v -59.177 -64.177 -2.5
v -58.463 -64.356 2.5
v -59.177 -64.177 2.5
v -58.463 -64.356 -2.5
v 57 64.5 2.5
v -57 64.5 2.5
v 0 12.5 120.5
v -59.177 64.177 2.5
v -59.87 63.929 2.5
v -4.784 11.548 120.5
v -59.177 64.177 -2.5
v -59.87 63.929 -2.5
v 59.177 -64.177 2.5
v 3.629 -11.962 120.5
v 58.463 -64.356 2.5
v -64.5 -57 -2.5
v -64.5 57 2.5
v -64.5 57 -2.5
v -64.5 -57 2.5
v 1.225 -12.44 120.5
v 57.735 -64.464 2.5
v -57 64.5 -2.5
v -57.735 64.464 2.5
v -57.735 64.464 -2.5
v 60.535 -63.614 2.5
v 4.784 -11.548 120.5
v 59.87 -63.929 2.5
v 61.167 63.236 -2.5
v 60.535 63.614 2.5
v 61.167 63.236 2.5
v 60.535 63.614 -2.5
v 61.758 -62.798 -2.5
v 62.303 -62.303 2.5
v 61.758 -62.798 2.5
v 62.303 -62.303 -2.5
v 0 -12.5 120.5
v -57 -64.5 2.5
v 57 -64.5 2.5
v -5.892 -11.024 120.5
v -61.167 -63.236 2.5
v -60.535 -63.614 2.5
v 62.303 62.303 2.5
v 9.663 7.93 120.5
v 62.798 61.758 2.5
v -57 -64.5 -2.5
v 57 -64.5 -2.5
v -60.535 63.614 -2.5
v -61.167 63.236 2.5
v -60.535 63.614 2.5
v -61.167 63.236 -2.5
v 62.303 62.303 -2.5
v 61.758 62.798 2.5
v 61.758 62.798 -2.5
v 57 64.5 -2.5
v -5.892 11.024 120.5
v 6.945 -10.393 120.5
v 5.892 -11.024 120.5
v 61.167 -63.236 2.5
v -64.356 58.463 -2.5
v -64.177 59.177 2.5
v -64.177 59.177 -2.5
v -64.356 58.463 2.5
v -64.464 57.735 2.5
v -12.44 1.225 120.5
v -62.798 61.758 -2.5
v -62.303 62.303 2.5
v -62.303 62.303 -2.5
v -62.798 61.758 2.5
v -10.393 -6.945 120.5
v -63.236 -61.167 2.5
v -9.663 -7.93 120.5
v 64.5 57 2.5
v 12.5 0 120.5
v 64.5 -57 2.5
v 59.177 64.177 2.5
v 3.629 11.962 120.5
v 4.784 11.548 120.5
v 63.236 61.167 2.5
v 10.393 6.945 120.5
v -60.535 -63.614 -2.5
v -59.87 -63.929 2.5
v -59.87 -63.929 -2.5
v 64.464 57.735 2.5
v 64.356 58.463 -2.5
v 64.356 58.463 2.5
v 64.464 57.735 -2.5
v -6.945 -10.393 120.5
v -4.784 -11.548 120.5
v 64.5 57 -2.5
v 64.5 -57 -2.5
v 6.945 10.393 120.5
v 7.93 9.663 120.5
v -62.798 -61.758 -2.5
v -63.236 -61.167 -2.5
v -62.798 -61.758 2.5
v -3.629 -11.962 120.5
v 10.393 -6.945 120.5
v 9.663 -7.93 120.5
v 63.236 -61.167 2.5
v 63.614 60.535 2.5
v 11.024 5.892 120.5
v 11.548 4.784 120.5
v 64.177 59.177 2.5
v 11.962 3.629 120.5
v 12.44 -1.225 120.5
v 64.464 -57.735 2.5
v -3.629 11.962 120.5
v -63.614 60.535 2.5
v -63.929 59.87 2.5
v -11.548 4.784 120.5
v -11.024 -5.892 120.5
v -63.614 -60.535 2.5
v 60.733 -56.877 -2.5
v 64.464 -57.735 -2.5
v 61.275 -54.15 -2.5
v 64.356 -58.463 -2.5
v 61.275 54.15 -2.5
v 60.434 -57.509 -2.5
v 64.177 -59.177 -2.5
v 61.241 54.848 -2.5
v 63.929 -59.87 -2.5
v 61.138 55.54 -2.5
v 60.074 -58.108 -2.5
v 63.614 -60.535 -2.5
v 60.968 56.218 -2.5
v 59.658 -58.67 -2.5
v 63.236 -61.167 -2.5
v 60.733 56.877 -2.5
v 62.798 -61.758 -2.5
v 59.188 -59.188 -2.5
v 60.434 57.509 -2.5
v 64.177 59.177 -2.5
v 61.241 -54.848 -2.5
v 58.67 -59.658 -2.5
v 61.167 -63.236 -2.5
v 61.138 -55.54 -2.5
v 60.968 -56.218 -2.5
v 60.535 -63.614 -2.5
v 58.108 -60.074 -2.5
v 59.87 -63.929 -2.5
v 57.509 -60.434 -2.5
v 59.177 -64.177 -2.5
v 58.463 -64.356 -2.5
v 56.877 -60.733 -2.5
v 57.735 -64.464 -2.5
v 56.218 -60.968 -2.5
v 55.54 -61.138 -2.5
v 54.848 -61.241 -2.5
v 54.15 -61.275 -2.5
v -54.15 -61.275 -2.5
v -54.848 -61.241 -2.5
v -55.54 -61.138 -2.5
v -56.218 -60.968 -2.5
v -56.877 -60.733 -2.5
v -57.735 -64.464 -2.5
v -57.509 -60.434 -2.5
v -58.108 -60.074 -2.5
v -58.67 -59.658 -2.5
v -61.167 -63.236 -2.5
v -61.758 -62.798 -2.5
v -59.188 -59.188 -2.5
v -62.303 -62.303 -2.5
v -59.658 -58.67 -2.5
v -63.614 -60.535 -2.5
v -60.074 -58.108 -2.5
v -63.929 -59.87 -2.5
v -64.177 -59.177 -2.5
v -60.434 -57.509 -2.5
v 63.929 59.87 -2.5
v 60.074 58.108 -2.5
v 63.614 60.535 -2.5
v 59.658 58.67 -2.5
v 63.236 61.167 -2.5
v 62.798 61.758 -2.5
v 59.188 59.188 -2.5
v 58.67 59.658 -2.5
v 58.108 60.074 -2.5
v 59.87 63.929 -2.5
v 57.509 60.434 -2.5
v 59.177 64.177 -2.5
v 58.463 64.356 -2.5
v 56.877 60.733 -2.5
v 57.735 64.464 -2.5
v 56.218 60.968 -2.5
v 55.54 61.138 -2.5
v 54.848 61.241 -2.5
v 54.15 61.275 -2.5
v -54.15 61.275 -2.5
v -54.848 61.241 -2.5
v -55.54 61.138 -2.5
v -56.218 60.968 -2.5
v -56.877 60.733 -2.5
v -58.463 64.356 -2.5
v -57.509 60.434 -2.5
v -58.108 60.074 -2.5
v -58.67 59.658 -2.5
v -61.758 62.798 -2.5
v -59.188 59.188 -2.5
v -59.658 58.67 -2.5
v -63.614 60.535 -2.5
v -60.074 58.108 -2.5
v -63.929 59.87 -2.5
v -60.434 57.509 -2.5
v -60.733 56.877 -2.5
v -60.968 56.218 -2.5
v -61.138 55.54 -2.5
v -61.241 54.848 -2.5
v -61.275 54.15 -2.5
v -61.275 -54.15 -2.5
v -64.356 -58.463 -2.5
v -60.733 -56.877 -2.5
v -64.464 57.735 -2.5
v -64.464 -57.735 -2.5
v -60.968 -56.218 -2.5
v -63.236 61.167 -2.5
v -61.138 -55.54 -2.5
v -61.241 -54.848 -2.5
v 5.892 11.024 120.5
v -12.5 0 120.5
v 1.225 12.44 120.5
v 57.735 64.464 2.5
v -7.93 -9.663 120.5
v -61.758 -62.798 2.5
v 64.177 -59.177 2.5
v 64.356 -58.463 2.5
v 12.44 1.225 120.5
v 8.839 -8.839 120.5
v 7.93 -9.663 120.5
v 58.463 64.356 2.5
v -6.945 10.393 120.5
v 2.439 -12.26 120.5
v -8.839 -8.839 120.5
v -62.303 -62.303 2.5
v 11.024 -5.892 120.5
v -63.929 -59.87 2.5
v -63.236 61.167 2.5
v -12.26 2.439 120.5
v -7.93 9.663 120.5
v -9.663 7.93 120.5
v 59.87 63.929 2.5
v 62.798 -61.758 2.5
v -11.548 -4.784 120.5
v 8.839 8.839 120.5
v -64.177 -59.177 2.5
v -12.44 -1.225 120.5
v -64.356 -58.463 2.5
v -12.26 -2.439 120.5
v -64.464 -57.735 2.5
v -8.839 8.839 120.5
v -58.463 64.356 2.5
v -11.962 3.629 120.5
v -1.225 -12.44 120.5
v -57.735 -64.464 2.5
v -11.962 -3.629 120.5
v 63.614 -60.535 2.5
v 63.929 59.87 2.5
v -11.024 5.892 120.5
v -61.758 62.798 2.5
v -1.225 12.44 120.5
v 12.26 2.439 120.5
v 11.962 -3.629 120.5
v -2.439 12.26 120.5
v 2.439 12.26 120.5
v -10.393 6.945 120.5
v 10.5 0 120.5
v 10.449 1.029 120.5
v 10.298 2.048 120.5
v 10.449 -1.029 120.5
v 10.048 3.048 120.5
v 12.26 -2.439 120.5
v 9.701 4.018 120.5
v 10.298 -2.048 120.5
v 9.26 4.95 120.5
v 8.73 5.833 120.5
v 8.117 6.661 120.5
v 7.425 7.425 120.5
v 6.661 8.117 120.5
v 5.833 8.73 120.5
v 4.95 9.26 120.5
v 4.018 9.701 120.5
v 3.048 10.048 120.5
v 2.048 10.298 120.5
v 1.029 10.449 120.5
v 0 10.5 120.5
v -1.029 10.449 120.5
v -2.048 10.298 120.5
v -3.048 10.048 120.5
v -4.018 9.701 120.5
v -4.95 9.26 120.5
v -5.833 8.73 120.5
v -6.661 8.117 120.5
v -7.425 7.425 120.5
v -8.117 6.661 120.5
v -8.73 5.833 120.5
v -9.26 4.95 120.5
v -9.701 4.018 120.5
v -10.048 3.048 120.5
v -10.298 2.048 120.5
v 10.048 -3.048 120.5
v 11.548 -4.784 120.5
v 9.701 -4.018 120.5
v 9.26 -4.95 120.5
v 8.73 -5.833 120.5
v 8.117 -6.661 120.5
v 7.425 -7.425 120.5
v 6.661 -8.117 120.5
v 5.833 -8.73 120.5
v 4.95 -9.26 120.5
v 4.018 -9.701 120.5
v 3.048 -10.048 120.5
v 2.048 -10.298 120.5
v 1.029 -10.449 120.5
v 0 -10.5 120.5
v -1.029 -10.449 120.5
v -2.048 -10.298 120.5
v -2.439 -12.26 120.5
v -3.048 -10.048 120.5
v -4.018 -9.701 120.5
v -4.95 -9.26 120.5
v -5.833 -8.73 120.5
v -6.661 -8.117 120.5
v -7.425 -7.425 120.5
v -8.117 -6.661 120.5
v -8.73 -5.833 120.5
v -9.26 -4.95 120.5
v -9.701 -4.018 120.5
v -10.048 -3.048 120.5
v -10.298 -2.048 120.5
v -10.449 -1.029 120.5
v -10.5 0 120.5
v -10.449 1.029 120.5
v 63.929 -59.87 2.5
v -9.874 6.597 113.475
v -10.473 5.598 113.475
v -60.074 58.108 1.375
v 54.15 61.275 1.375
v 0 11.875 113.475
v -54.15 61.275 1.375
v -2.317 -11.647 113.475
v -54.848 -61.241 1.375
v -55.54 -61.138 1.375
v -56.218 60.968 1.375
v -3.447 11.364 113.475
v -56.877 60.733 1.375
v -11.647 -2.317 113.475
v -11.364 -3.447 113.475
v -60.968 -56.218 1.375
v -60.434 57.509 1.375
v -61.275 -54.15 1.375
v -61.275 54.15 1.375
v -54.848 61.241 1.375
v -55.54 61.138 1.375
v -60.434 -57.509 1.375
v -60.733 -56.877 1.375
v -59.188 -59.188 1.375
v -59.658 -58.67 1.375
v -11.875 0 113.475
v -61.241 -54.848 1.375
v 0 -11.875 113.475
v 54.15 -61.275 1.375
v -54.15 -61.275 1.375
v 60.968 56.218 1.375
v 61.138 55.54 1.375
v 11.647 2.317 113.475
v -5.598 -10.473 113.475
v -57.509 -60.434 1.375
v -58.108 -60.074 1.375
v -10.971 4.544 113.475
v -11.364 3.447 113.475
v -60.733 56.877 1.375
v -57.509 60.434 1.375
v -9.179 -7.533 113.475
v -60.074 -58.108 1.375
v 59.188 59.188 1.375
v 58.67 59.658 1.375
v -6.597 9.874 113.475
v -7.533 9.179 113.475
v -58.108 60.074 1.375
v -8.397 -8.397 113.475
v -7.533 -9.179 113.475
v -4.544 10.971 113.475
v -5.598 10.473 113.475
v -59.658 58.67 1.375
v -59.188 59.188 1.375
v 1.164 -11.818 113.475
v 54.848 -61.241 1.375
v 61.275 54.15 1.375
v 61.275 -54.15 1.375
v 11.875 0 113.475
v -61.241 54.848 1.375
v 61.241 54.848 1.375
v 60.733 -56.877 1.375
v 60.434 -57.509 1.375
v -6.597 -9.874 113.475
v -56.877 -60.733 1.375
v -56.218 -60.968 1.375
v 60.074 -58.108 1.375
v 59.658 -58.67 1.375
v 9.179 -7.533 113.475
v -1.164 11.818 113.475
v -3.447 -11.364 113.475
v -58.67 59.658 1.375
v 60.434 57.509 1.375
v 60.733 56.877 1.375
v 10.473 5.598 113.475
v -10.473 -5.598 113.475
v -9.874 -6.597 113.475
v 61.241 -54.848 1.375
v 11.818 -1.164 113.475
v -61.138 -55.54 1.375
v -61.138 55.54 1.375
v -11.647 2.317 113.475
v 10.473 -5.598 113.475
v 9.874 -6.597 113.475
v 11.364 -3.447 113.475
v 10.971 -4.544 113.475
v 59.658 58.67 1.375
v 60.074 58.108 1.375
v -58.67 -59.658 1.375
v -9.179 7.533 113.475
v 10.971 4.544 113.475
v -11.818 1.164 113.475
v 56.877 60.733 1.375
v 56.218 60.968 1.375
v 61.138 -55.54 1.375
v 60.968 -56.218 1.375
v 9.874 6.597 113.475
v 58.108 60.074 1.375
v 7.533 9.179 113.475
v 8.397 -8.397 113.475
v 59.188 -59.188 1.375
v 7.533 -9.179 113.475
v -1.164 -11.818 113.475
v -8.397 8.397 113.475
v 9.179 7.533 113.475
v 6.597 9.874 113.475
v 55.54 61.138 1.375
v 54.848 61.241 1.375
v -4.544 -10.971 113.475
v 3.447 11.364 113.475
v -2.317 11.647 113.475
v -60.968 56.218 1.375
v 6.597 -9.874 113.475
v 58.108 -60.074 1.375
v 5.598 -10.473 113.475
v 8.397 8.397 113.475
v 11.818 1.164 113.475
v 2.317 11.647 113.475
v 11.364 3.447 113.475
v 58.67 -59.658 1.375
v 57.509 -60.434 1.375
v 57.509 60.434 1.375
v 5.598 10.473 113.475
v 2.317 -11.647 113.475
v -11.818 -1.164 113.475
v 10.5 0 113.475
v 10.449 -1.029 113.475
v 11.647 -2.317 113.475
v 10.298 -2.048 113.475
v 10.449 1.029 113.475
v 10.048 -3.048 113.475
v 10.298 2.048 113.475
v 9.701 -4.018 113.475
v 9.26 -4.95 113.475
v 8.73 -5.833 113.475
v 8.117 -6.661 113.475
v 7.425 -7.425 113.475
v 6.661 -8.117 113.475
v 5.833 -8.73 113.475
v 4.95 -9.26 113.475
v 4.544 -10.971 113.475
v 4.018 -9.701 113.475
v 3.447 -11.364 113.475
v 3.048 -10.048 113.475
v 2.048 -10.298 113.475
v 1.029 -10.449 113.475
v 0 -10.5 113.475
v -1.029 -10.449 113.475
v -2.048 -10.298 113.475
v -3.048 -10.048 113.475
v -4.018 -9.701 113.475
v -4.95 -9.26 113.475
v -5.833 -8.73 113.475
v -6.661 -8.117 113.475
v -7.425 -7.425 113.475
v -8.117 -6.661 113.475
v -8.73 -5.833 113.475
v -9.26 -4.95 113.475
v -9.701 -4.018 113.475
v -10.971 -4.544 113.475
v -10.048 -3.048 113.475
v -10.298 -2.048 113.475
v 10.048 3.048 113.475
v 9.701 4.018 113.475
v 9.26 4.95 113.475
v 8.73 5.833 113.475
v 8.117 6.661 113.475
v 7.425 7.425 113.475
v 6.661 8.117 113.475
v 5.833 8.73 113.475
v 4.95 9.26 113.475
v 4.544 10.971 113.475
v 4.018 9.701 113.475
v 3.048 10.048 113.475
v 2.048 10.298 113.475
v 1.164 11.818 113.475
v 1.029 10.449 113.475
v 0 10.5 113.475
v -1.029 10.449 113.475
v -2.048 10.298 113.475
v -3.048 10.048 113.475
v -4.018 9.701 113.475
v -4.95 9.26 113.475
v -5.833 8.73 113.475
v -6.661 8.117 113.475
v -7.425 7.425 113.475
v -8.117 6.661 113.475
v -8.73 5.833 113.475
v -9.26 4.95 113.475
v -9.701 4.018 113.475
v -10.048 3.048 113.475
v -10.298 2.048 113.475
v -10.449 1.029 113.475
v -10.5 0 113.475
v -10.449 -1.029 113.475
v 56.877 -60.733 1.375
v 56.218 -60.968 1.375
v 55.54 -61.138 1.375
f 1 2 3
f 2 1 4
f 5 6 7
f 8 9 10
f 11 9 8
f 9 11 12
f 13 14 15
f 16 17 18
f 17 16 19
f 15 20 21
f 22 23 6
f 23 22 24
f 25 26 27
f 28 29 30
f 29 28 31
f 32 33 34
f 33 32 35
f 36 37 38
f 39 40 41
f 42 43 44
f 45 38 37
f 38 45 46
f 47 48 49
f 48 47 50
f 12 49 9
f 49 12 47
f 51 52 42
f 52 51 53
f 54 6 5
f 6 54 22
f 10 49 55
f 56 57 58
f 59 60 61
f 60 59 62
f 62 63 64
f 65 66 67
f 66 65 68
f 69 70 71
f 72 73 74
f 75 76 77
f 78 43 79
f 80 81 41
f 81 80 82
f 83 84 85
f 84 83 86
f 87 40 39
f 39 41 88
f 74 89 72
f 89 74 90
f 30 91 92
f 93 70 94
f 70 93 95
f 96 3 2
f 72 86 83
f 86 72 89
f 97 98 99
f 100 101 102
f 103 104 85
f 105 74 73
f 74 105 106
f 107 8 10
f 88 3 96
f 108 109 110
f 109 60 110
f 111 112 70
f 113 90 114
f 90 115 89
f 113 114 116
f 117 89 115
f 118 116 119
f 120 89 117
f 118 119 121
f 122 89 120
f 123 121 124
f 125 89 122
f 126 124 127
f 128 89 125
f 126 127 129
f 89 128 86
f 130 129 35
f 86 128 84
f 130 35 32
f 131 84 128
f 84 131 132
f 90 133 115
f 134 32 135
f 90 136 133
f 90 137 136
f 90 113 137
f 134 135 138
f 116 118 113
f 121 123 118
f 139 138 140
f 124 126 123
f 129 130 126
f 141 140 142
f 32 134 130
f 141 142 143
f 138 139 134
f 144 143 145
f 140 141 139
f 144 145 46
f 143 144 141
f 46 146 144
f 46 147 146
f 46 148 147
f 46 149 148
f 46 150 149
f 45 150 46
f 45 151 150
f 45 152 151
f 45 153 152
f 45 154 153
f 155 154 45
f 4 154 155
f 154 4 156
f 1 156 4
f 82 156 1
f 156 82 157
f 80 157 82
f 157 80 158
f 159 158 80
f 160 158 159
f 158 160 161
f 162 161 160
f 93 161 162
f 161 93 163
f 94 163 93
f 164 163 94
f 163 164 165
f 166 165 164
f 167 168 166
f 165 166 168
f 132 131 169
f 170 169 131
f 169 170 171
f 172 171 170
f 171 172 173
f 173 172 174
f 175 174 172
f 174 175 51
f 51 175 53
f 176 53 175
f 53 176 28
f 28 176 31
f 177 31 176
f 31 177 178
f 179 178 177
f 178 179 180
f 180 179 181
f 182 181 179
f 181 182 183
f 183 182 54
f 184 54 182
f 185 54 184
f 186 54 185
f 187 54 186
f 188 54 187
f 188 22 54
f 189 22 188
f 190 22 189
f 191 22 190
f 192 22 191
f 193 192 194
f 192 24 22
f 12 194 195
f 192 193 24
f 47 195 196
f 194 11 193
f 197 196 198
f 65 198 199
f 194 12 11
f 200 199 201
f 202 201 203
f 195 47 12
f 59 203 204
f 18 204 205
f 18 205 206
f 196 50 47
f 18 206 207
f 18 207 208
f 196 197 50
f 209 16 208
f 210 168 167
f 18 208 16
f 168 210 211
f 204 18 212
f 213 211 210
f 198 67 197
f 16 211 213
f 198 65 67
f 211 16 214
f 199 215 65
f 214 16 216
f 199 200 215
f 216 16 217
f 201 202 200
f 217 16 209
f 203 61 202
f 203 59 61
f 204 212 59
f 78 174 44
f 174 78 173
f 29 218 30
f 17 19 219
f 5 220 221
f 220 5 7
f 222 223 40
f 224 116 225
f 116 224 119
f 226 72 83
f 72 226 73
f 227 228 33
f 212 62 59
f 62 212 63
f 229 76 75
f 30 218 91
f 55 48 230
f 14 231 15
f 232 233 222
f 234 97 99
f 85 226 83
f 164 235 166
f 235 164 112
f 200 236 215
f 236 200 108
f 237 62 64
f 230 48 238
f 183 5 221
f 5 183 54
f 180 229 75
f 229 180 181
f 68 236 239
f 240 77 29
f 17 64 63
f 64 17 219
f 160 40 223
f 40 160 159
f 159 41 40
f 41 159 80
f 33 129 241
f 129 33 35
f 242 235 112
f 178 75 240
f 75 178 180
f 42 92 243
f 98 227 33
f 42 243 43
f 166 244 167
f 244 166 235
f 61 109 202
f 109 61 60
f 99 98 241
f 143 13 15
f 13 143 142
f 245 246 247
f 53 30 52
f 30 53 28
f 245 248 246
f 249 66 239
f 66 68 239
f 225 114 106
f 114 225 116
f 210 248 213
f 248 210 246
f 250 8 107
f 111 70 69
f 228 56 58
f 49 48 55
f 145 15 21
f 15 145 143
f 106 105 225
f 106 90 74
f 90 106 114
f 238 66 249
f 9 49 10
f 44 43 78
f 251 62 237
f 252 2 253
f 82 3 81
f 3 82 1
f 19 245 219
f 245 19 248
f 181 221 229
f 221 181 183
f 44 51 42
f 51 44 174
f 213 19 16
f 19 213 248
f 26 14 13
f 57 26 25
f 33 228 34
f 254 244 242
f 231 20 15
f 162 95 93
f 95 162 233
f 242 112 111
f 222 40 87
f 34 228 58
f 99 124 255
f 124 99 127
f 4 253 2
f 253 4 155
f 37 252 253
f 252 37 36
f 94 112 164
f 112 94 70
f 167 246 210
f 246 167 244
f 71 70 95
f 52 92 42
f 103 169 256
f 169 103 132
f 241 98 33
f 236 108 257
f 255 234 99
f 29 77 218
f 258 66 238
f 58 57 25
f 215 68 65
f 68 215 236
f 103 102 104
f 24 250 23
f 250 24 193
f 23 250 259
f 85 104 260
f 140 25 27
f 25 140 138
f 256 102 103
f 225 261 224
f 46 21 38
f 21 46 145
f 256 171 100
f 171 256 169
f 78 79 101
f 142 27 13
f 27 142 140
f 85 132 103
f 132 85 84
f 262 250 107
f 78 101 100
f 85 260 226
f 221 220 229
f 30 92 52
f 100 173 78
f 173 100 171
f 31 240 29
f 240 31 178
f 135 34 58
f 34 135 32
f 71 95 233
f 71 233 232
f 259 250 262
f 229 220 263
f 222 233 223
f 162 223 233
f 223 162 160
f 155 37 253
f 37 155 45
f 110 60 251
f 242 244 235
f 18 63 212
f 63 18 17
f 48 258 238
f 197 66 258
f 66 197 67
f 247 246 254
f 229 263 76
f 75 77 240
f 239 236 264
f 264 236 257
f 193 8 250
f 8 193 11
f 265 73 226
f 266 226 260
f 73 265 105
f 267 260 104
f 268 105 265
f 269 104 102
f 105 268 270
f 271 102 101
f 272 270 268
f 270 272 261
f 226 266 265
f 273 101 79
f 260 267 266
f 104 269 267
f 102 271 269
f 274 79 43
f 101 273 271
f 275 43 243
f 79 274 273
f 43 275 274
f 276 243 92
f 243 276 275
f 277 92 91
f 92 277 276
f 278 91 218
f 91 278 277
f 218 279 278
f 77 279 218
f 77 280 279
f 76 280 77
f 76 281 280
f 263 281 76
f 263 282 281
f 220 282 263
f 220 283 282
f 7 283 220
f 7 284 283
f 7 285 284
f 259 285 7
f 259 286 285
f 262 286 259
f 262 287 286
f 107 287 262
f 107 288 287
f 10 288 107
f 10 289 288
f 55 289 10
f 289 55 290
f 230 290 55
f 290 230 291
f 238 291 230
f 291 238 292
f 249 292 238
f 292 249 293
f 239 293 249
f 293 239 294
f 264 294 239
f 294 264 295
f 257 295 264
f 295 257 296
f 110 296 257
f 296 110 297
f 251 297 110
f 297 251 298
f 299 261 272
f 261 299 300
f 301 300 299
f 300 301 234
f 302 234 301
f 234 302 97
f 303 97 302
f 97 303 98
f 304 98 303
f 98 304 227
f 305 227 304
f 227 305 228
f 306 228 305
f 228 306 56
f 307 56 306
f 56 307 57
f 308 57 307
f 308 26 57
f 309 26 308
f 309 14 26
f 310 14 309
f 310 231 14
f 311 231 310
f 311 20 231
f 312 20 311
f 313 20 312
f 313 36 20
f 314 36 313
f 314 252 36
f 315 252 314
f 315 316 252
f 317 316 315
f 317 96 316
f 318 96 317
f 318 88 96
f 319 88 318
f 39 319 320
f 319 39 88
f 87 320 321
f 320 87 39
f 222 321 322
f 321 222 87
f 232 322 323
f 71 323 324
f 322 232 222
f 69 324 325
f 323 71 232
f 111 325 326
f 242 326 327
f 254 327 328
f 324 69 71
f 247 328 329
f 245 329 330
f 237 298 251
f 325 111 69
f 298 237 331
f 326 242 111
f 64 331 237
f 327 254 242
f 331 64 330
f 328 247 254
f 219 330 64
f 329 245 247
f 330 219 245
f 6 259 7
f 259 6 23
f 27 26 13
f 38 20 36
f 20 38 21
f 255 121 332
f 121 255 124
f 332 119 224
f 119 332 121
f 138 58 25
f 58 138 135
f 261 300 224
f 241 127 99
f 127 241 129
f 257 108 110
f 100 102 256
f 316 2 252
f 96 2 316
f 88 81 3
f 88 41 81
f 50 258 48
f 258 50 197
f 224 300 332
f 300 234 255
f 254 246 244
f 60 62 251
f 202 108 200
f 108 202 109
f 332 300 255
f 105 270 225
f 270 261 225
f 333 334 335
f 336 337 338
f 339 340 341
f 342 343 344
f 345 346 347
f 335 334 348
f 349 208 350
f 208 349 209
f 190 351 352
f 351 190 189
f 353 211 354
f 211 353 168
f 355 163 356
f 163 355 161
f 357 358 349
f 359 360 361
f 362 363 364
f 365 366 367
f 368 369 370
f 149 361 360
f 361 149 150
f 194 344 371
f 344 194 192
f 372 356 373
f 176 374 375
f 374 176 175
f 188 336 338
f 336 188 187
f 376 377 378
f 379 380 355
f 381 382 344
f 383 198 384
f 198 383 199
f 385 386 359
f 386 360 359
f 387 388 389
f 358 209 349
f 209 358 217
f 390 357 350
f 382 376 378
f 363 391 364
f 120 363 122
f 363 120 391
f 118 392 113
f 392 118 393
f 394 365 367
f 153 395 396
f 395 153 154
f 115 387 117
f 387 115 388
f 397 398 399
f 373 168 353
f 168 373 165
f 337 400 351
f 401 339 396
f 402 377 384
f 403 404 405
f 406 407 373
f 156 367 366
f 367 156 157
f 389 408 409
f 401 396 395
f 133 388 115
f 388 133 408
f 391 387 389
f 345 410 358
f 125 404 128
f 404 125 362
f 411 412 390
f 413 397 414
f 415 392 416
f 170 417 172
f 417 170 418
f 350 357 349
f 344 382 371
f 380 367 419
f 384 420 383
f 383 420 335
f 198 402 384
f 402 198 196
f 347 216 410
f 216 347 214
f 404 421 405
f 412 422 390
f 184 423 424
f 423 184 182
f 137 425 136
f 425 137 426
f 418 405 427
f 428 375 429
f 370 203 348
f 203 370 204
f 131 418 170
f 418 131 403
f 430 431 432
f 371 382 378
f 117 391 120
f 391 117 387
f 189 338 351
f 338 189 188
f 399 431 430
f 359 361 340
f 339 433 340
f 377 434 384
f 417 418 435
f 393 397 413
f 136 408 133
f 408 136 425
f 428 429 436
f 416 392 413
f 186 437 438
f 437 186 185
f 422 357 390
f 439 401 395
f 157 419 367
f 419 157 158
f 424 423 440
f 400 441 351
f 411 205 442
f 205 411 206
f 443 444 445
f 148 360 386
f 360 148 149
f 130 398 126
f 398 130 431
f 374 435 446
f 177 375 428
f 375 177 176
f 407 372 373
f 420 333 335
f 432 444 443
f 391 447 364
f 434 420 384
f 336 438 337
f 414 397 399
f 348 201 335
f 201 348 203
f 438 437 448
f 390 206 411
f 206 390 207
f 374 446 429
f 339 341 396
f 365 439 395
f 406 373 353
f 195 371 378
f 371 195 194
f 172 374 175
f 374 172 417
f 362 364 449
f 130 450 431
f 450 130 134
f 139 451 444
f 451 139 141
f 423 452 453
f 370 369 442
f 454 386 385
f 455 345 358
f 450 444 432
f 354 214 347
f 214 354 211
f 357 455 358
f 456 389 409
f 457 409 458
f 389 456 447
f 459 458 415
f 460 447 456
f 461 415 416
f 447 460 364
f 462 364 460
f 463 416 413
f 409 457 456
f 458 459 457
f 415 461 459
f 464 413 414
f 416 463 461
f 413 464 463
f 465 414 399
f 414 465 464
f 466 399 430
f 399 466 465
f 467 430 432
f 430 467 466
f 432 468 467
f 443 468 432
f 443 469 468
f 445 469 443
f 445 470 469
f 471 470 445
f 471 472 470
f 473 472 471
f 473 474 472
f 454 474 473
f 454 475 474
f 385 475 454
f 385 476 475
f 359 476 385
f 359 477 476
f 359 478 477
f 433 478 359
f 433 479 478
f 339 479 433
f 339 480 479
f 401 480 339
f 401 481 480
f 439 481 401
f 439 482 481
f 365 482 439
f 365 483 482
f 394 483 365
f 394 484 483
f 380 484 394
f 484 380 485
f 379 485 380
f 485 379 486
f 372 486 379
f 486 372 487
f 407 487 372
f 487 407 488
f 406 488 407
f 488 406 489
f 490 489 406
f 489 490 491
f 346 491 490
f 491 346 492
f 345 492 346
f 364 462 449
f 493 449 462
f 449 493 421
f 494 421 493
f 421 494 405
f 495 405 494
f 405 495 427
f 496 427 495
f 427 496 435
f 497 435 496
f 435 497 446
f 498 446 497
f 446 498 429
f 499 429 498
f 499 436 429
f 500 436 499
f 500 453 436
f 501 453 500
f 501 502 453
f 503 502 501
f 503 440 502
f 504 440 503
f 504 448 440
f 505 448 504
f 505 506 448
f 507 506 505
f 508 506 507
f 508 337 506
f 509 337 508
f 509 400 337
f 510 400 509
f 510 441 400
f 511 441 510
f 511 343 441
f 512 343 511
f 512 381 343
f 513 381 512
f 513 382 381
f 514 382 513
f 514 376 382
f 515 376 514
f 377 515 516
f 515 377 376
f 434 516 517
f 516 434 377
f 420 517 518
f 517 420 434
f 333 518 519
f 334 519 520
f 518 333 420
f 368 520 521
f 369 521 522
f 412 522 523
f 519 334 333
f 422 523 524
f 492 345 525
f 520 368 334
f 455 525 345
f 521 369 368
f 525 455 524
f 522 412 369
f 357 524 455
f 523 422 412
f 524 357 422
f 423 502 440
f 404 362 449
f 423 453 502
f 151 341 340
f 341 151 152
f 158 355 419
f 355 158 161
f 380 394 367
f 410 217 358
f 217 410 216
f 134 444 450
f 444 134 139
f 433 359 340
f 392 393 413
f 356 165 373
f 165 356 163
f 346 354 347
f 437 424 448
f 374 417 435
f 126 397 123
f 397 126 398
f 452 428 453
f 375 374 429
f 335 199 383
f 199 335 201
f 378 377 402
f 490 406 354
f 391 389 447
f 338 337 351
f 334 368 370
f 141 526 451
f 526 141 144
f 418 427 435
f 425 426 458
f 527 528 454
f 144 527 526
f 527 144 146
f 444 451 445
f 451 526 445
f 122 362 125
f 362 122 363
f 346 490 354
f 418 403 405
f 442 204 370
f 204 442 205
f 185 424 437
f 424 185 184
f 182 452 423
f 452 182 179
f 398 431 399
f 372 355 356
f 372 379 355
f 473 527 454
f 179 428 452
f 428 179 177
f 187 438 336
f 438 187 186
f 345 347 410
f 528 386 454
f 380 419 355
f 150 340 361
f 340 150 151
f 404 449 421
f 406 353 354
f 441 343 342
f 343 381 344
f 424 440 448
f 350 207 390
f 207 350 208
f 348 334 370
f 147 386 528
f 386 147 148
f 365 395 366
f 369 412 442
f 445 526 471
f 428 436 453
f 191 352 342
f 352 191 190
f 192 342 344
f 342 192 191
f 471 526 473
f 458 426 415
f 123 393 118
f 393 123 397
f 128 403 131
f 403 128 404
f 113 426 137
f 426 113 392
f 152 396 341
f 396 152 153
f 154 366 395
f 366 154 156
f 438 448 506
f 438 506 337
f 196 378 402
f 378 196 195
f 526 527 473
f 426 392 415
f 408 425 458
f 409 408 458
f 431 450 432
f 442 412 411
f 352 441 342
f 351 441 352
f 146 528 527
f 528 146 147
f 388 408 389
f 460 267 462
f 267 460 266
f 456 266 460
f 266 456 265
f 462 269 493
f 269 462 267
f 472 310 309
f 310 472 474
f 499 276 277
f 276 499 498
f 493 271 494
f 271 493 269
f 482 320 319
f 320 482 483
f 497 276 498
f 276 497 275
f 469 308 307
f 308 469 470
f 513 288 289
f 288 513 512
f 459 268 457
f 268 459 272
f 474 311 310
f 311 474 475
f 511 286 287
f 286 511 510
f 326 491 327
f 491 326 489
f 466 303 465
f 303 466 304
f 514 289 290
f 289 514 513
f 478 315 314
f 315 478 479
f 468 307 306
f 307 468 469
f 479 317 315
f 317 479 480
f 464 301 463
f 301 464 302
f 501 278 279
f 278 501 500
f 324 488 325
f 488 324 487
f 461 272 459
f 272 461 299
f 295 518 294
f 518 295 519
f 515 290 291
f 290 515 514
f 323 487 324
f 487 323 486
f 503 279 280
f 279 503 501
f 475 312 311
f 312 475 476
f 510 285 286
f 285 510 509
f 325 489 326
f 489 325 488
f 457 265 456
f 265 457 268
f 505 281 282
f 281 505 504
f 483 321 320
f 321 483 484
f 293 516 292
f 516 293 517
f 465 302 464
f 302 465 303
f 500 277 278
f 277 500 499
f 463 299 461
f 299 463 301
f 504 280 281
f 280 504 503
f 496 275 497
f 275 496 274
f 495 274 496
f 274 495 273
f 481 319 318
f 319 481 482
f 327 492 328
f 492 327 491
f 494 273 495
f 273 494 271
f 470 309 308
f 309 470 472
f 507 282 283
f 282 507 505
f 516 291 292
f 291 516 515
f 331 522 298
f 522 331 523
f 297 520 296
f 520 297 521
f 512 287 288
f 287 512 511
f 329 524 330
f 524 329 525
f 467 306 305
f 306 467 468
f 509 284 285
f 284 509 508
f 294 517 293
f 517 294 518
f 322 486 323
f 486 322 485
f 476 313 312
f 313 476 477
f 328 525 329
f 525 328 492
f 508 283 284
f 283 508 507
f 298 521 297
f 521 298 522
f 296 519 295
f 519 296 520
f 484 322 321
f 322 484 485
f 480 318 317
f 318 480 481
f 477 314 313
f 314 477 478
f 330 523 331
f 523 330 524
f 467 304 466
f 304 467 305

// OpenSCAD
echo("Работа Емельянова Михаила");
$fn=64;
round_corner = 15;

//translate([0, 0, 10])
//color("green")
//cube([129, 129, 1], center = true);

difference() {
    nozzle_kit();
    translate([0, 0, 120])
    cylinder(d = 25-4, h = 15, center = true);
}

module nozzle_kit() {
difference() {
    nozzle();
    translate([0, 0, -1])
    scale([0.95, 0.95, 0.95])
    color("red")
    nozzle();
}
}

module nozzle() {
    hull() {
    frame_square();
    translate([0, 0, 120])
    frame_ring();
}
}
//hull() {
//    frame_square();
//    translate([0, 0, 120])
//    cylinder(d=25, h=1, center = true);
//}

module frame_ring() {
    difference() {
        cylinder(d=25, h=1, center = true);
        color("red")
        cylinder(d=25-6, h=5, center = true);
}
}

module frame_square() {
difference() {
    square_plate();
    translate([0, 0, 1])
    color("red")
    scale([0.95, 0.95, 4])
    square_plate();
}
}

module square_plate() {
hull() {
//    cube([129-round_corner, 129, 1], center = true);
    translate([129/2-round_corner/2, 129/2-round_corner/2, 0])
    color("red")
    cylinder(d = round_corner, h = 5, center = true);
        
    mirror([1, 0, 0])
    translate([129/2-round_corner/2, 129/2-round_corner/2, 0])    
    color("red")
    cylinder(d = round_corner, h = 5, center = true);
        
    mirror([0, 1, 0])
    translate([129/2-round_corner/2, 129/2-round_corner/2, 0])     
    color("red")
    cylinder(d = round_corner, h = 5, center = true);
        
    mirror([1, 1, 0])
    translate([129/2-round_corner/2, 129/2-round_corner/2, 0])    
    color("red")
    cylinder(d = round_corner, h = 5, center = true);
    }
}


////hull() {
//    square(129, center = true);
//    translate([0, 0, 120])
//    circle(25);
////}
